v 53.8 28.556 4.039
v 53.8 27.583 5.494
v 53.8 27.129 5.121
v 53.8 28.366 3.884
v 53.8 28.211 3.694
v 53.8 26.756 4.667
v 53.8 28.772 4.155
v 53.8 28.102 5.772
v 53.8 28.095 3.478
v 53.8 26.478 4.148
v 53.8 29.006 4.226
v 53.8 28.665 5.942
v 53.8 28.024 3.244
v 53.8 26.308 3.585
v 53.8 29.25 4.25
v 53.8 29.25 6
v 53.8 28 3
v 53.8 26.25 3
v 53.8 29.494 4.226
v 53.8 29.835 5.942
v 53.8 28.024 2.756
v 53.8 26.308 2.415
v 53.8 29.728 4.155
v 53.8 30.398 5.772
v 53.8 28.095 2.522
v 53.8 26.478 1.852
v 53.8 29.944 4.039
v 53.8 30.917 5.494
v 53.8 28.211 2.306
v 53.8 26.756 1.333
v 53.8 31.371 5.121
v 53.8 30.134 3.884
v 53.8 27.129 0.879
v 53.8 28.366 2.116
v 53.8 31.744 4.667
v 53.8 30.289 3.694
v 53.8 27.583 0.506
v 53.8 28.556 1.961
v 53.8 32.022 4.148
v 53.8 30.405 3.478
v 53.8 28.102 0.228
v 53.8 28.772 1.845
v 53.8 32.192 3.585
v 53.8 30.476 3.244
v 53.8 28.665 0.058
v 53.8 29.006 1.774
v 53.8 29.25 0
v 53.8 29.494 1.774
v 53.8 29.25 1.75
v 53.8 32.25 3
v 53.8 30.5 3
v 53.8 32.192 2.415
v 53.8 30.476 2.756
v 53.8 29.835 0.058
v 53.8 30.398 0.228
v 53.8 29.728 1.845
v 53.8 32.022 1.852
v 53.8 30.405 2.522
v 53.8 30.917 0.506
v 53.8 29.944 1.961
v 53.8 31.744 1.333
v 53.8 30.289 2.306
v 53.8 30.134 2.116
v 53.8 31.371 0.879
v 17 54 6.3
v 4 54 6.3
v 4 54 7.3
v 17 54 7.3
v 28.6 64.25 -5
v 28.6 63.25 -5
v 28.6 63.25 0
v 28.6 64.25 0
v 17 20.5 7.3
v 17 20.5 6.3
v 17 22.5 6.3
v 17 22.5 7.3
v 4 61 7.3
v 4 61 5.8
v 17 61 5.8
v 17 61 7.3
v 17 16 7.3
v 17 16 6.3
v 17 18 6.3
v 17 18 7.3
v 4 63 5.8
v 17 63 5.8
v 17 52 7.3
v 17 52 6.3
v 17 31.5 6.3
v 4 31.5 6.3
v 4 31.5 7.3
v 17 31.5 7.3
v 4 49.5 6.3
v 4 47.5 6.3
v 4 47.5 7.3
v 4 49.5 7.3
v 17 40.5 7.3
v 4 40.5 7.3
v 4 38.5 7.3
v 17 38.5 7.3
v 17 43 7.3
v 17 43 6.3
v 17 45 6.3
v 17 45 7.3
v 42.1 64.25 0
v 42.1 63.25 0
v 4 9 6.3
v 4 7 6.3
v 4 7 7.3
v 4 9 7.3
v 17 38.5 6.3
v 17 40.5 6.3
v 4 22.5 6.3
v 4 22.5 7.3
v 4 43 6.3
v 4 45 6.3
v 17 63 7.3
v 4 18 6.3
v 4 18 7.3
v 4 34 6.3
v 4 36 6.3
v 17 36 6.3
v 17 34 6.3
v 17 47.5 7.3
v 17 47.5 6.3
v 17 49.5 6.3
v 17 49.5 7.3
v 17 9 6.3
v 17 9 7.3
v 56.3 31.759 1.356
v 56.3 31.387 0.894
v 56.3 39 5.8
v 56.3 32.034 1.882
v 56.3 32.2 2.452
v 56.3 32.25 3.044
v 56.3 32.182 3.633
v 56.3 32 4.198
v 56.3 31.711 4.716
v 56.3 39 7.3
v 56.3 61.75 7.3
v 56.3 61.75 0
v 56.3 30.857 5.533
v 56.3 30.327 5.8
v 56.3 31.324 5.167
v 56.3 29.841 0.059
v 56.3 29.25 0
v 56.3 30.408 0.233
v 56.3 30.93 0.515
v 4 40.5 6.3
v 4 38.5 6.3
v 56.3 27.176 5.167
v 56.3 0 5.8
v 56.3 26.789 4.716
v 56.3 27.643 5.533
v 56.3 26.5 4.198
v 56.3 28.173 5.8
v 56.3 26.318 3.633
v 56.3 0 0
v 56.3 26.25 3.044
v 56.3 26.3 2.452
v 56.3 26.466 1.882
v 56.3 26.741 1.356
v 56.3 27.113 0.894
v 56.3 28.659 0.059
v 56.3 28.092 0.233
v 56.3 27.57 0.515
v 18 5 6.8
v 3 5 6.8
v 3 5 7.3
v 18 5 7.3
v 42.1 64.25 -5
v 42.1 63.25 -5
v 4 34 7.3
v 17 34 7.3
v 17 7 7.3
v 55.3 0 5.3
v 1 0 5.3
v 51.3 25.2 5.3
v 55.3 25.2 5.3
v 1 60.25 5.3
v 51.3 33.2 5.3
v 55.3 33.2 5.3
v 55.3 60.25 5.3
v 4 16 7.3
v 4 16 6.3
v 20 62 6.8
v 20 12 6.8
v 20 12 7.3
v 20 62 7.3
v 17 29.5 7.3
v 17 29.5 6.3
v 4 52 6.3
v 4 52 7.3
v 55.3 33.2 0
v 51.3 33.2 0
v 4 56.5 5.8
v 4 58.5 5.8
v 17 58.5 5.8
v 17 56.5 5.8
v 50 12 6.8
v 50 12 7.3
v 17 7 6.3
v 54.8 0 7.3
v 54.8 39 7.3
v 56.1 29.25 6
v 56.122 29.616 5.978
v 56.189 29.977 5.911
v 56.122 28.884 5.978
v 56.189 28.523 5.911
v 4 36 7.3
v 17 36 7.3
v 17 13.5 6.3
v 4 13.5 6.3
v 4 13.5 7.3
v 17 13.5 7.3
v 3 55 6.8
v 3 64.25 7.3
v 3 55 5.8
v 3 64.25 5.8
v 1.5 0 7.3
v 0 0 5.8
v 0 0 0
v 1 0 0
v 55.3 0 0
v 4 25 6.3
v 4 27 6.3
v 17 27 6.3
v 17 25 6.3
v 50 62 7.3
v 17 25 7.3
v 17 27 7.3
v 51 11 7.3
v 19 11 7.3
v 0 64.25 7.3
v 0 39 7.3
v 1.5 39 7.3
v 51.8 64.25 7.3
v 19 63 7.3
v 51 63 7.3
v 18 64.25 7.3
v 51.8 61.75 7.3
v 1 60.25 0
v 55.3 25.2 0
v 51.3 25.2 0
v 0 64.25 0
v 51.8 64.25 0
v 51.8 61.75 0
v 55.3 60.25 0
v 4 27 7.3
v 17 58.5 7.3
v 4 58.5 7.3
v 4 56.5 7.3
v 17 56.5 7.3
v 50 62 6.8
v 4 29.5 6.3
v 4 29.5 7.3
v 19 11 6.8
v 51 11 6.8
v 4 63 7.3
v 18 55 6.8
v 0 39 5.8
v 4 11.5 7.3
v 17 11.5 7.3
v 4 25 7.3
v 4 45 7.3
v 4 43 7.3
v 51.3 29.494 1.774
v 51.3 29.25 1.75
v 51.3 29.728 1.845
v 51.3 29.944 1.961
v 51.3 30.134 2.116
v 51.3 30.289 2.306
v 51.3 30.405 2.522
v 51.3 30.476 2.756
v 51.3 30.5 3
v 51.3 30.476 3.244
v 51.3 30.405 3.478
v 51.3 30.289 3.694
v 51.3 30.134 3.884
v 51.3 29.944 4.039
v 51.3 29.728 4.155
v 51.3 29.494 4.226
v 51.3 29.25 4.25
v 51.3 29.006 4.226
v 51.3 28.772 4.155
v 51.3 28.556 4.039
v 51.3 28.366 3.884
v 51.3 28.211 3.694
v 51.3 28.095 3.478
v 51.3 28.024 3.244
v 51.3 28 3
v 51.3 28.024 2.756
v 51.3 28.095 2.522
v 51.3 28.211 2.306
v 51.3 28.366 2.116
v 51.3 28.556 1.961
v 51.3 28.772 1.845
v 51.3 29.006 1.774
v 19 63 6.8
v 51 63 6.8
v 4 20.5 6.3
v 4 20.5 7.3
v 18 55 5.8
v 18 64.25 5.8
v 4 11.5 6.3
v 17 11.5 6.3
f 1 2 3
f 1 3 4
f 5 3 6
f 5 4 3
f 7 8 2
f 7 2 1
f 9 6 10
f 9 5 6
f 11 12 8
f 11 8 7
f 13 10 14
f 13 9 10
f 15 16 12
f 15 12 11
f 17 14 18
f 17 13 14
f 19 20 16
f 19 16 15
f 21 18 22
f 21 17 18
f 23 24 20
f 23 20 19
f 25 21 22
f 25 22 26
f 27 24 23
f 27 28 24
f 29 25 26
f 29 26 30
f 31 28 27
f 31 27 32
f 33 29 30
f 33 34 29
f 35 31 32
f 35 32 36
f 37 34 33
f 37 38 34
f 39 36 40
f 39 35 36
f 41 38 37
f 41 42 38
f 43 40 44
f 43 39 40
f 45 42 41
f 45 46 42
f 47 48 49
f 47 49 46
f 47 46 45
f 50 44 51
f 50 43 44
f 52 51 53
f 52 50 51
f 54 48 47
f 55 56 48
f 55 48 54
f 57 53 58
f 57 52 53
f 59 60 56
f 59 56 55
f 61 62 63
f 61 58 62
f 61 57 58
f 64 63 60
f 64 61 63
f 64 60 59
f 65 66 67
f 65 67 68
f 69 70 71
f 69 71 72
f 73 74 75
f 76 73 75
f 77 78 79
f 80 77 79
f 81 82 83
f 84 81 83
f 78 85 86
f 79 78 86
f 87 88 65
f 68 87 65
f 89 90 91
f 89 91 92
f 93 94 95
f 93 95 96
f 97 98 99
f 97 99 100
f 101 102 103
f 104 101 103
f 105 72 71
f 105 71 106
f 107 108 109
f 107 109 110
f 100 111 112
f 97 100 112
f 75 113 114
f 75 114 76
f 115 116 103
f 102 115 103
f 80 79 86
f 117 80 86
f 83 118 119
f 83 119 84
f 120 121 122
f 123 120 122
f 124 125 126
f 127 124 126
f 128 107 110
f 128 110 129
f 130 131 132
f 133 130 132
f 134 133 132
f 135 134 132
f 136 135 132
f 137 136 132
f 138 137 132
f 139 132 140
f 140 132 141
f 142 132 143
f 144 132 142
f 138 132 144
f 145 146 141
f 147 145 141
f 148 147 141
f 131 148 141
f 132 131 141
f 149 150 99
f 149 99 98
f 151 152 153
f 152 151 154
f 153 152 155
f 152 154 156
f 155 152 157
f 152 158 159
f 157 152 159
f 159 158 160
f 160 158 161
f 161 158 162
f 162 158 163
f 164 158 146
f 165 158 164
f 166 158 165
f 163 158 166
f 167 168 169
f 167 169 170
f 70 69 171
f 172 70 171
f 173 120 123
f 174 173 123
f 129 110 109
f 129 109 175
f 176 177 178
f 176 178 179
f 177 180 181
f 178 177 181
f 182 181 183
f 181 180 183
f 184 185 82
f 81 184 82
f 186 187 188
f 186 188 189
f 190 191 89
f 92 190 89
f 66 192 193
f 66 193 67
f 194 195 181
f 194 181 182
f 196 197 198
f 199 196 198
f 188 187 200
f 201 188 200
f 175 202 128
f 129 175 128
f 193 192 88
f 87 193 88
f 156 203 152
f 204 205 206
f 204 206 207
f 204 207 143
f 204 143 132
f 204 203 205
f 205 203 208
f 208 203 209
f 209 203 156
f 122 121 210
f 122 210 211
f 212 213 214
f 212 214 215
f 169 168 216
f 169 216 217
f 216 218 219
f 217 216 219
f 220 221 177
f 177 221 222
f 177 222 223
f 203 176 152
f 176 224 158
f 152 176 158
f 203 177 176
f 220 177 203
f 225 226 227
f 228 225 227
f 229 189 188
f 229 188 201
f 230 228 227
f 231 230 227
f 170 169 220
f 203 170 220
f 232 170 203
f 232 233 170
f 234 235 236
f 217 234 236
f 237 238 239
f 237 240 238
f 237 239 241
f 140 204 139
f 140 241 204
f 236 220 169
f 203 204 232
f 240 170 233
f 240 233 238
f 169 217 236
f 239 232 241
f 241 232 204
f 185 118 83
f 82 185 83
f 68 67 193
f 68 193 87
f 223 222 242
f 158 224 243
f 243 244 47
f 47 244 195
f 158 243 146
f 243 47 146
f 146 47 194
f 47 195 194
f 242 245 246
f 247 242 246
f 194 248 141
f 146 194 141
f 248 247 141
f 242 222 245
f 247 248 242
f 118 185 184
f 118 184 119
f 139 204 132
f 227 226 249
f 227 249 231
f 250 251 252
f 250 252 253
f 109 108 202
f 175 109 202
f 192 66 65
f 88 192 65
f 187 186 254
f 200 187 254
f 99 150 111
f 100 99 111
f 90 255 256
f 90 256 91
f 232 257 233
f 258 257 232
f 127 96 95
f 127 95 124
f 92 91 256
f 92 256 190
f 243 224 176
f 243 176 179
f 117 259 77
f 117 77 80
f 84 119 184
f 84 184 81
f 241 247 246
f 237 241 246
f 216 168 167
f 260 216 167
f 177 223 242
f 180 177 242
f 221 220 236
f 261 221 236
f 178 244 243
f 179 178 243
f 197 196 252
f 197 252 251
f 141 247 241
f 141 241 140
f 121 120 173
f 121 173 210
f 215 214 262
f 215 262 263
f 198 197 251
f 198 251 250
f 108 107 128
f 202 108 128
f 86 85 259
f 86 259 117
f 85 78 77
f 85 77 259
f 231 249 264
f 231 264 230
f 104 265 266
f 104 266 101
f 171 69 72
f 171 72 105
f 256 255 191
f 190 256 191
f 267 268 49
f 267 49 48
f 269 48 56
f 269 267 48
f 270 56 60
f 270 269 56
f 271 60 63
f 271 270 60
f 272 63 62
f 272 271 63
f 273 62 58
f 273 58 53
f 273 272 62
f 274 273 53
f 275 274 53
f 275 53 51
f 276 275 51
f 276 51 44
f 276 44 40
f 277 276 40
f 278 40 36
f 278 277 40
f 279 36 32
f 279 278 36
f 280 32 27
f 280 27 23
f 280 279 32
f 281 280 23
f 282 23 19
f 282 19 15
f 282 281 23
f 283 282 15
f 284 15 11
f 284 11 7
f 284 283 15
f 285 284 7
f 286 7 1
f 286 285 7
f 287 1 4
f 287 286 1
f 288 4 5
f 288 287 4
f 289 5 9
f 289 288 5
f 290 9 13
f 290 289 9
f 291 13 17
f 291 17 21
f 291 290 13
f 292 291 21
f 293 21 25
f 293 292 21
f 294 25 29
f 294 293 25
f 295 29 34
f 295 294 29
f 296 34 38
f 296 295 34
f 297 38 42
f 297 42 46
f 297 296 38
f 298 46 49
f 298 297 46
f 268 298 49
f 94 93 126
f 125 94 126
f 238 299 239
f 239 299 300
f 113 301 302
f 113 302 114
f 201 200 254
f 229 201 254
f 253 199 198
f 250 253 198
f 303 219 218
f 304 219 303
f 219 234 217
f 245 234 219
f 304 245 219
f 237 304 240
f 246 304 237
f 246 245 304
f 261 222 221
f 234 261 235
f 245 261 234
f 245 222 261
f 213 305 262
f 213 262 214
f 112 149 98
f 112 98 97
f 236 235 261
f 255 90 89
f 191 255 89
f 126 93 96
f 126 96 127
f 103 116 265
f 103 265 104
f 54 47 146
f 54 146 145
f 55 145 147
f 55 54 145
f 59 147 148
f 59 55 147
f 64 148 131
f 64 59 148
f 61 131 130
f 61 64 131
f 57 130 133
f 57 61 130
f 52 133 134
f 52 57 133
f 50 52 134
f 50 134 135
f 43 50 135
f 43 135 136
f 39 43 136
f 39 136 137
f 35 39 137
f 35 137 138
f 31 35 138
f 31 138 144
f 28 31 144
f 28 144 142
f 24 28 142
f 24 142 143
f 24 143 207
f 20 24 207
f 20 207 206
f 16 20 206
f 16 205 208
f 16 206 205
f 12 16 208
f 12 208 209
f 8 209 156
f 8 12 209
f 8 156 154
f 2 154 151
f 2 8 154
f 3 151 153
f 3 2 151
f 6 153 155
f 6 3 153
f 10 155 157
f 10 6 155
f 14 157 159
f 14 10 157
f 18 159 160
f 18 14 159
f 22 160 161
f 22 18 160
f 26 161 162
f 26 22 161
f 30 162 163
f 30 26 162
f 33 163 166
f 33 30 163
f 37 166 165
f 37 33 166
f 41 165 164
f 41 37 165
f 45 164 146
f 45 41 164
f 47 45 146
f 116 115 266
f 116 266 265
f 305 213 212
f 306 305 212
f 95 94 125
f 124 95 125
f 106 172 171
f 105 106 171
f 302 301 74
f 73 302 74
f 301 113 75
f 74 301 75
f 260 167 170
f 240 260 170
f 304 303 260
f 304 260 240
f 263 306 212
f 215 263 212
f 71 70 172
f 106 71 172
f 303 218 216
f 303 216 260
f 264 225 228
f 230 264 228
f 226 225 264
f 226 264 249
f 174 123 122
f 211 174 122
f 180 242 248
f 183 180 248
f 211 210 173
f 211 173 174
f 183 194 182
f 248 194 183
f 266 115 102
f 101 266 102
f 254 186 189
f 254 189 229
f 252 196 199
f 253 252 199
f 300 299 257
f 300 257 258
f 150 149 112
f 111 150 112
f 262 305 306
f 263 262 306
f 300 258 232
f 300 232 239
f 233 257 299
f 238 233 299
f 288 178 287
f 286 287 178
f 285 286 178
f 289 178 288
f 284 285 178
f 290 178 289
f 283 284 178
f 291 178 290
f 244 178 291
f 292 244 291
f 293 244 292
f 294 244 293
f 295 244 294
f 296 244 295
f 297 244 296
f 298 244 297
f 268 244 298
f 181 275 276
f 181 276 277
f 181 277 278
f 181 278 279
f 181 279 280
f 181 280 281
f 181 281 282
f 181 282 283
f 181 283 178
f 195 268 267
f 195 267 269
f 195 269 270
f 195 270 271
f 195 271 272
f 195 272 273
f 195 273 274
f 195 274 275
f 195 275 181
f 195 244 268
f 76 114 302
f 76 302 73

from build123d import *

# Parameters (mm, degrees)
BOX017_W          = 30
BOX017_H          = 50
BOX017_DEPTH      = 0.5
BOX020_W          = 13
BOX020_H          = 2
BOX020_DEPTH      = 1
BOX021_W          = 13
BOX021_H          = 2
BOX021_DEPTH      = 1
BOX022_W          = 13
BOX022_H          = 2
BOX022_DEPTH      = 1
BOX023_W          = 13
BOX023_H          = 2
BOX023_DEPTH      = 1
BOX024_W          = 13
BOX024_H          = 2
BOX024_DEPTH      = 1
BOX025_W          = 13
BOX025_H          = 2
BOX025_DEPTH      = 1
BOX030_W          = 13
BOX030_H          = 2
BOX030_DEPTH      = 1
BOX031_W          = 13
BOX031_H          = 2
BOX031_DEPTH      = 1
BOX032_W          = 13
BOX032_H          = 2
BOX032_DEPTH      = 1
BOX034_W          = 13
BOX034_H          = 2
BOX034_DEPTH      = 1
BOX035_W          = 13
BOX035_H          = 2
BOX035_DEPTH      = 1
BOX038_W          = 13
BOX038_H          = 2
BOX038_DEPTH      = 1.5
BOX040_W          = 13
BOX040_H          = 2
BOX040_DEPTH      = 1.5
BOX043_W          = 13.5
BOX043_H          = 1
BOX043_DEPTH      = 5
CYLINDER001_R     = 1.25
CYLINDER001_DEPTH = 2.5
CYLINDER_R        = 3
CYLINDER_DEPTH    = 2.5
BOX041_W          = 32
BOX041_H          = 52
BOX041_DEPTH      = 0.5
BOX018_W          = 15
BOX018_H          = 53
BOX018_DEPTH      = 0.5
BOX008_W          = 56.3
BOX008_H          = 39
BOX008_DEPTH      = 2
CHAMFER_SIZE      = 1.5
BOX019_W          = 15
BOX019_H          = 9.25
BOX019_DEPTH      = 1.5
BOX029_W          = 17
BOX029_H          = 9.25
BOX029_DEPTH      = 1.5
BOX010_W          = 10
BOX010_H          = 10
BOX010_DEPTH      = 10
BOX007_W          = 56.3
BOX007_H          = 25.25
BOX007_DEPTH      = 2
BOX042_W          = 54.3
BOX042_H          = 60.25
BOX042_DEPTH      = 5.3
BOX001_W          = 4.5
BOX001_H          = 2.5
BOX001_DEPTH      = 5.3
BOX_W             = 56.3
BOX_H             = 64.25
BOX_DEPTH         = 5.3
BOX044_W          = 4
BOX044_H          = 8
BOX044_DEPTH      = 5.3


with BuildPart() as cube_game_lable_inner:
    # Box017 → Box017 (new body)
    with BuildSketch(Plane(origin=(20, 12, 6.8), x_dir=(1, 0, 0), z_dir=(0, 0, 1))):
        with Locations((15, 25)):
            Rectangle(BOX017_W, BOX017_H)
    extrude(amount=BOX017_DEPTH)


with BuildPart() as cube_ladders:
    # Box020 → Box020 (new body)
    with BuildSketch(Plane(origin=(4, 7, 6.3), x_dir=(1, 0, 0), z_dir=(0, 0, 1))):
        with Locations((6.5, 1)):
            Rectangle(BOX020_W, BOX020_H)
    extrude(amount=BOX020_DEPTH)


with BuildPart() as box021:
    # Box021 → Box021 (new body)
    with BuildSketch(Plane(origin=(4, 11.5, 6.3), x_dir=(1, 0, 0), z_dir=(0, 0, 1))):
        with Locations((6.5, 1)):
            Rectangle(BOX021_W, BOX021_H)
    extrude(amount=BOX021_DEPTH)


with BuildPart() as box022:
    # Box022 → Box022 (new body)
    with BuildSketch(Plane(origin=(4, 16, 6.3), x_dir=(1, 0, 0), z_dir=(0, 0, 1))):
        with Locations((6.5, 1)):
            Rectangle(BOX022_W, BOX022_H)
    extrude(amount=BOX022_DEPTH)


with BuildPart() as box023:
    # Box023 → Box023 (new body)
    with BuildSketch(Plane(origin=(4, 20.5, 6.3), x_dir=(1, 0, 0), z_dir=(0, 0, 1))):
        with Locations((6.5, 1)):
            Rectangle(BOX023_W, BOX023_H)
    extrude(amount=BOX023_DEPTH)


with BuildPart() as box024:
    # Box024 → Box024 (new body)
    with BuildSketch(Plane(origin=(4, 25, 6.3), x_dir=(1, 0, 0), z_dir=(0, 0, 1))):
        with Locations((6.5, 1)):
            Rectangle(BOX024_W, BOX024_H)
    extrude(amount=BOX024_DEPTH)


with BuildPart() as box025:
    # Box025 → Box025 (new body)
    with BuildSketch(Plane(origin=(4, 29.5, 6.3), x_dir=(1, 0, 0), z_dir=(0, 0, 1))):
        with Locations((6.5, 1)):
            Rectangle(BOX025_W, BOX025_H)
    extrude(amount=BOX025_DEPTH)


with BuildPart() as box030:
    # Box030 → Box030 (new body)
    with BuildSketch(Plane(origin=(4, 34, 6.3), x_dir=(1, 0, 0), z_dir=(0, 0, 1))):
        with Locations((6.5, 1)):
            Rectangle(BOX030_W, BOX030_H)
    extrude(amount=BOX030_DEPTH)


with BuildPart() as box031:
    # Box031 → Box031 (new body)
    with BuildSketch(Plane(origin=(4, 38.5, 6.3), x_dir=(1, 0, 0), z_dir=(0, 0, 1))):
        with Locations((6.5, 1)):
            Rectangle(BOX031_W, BOX031_H)
    extrude(amount=BOX031_DEPTH)


with BuildPart() as box032:
    # Box032 → Box032 (new body)
    with BuildSketch(Plane(origin=(4, 43, 6.3), x_dir=(1, 0, 0), z_dir=(0, 0, 1))):
        with Locations((6.5, 1)):
            Rectangle(BOX032_W, BOX032_H)
    extrude(amount=BOX032_DEPTH)


with BuildPart() as box034:
    # Box034 → Box034 (new body)
    with BuildSketch(Plane(origin=(4, 47.5, 6.3), x_dir=(1, 0, 0), z_dir=(0, 0, 1))):
        with Locations((6.5, 1)):
            Rectangle(BOX034_W, BOX034_H)
    extrude(amount=BOX034_DEPTH)


with BuildPart() as box035:
    # Box035 → Box035 (new body)
    with BuildSketch(Plane(origin=(4, 52, 6.3), x_dir=(1, 0, 0), z_dir=(0, 0, 1))):
        with Locations((6.5, 1)):
            Rectangle(BOX035_W, BOX035_H)
    extrude(amount=BOX035_DEPTH)


with BuildPart() as box038:
    # Box038 → Box038 (new body)
    with BuildSketch(Plane(origin=(4, 56.5, 5.8), x_dir=(1, 0, 0), z_dir=(0, 0, 1))):
        with Locations((6.5, 1)):
            Rectangle(BOX038_W, BOX038_H)
    extrude(amount=BOX038_DEPTH)


with BuildPart() as box040:
    # Box040 → Box040 (new body)
    with BuildSketch(Plane(origin=(4, 61, 5.8), x_dir=(1, 0, 0), z_dir=(0, 0, 1))):
        with Locations((6.5, 1)):
            Rectangle(BOX040_W, BOX040_H)
    extrude(amount=BOX040_DEPTH)


with BuildPart() as cube_sd_card_cover:
    # Box043 → Box043 (new body)
    with BuildSketch(Plane(origin=(28.6, 63.25, -5), x_dir=(1, 0, 0), z_dir=(0, 0, 1))):
        with Locations((6.75, 0.5)):
            Rectangle(BOX043_W, BOX043_H)
    extrude(amount=BOX043_DEPTH)


with BuildPart() as cylinder001:
    # Cylinder001 → Cylinder001 (new body)
    with BuildSketch(Plane(origin=(51.3, 29.25, 3), x_dir=(0, 0, -1), z_dir=(1, 0, 0))):
        Circle(CYLINDER001_R)
    extrude(amount=CYLINDER001_DEPTH)


with BuildPart() as fusion:
    # Cylinder → Cylinder (new body)
    with BuildSketch(Plane(origin=(53.8, 29.25, 3), x_dir=(0, 0, -1), z_dir=(1, 0, 0))):
        Circle(CYLINDER_R)
    extrude(amount=CYLINDER_DEPTH)

    # Fusion: union Cylinder001
    add(cylinder001.part)


with BuildPart() as cube_game_lable_outer:
    # Box041 → Box041 (new body)
    with BuildSketch(Plane(origin=(19, 11, 6.8), x_dir=(1, 0, 0), z_dir=(0, 0, 1))):
        with Locations((16, 26)):
            Rectangle(BOX041_W, BOX041_H)
    extrude(amount=BOX041_DEPTH)


with BuildPart() as cube_cube_strips:
    # Box018 → Box018 (new body)
    with BuildSketch(Plane(origin=(3, 5, 6.8), x_dir=(1, 0, 0), z_dir=(0, 0, 1))):
        with Locations((7.5, 26.5)):
            Rectangle(BOX018_W, BOX018_H)
    extrude(amount=BOX018_DEPTH)


with BuildPart() as chamfer_body:
    # Box008 → Box008 (new body)
    with BuildSketch(Plane.XY.offset(5.3)):
        with Locations((28.15, 19.5)):
            Rectangle(BOX008_W, BOX008_H)
    extrude(amount=BOX008_DEPTH)

    # Chamfer
    chamfer_edges = [chamfer_body.edges().sort_by_distance(p)[0] for p in [
        (0, 19.5, 7.3),
        (56.3, 19.5, 7.3),
    ]]
    chamfer(chamfer_edges, length=CHAMFER_SIZE)


with BuildPart() as cube_cube_strip_top:
    # Box019 → Box019 (new body)
    with BuildSketch(Plane(origin=(3, 55, 5.8), x_dir=(1, 0, 0), z_dir=(0, 0, 1))):
        with Locations((7.5, 4.625)):
            Rectangle(BOX019_W, BOX019_H)
    extrude(amount=BOX019_DEPTH)


with BuildPart() as cube_cube_strip_top_outer:
    # Box029 → Box029 (new body)
    with BuildSketch(Plane(origin=(2, 55, 5.8), x_dir=(1, 0, 0), z_dir=(0, 0, 1))):
        with Locations((8.5, 4.625)):
            Rectangle(BOX029_W, BOX029_H)
    extrude(amount=BOX029_DEPTH)


with BuildPart() as cube_top_corner_cut:
    # Box010 → Box010 (new body)
    with BuildSketch(Plane(origin=(51.8, 61.75, 0), x_dir=(1, 0, 0), z_dir=(0, 0, 1))):
        with Locations((5, 5)):
            Rectangle(BOX010_W, BOX010_H)
    extrude(amount=BOX010_DEPTH)


with BuildPart() as cut013:
    # Box007 → Box007 (new body)
    with BuildSketch(Plane(origin=(0, 39, 5.3), x_dir=(1, 0, 0), z_dir=(0, 0, 1))):
        with Locations((28.15, 12.625)):
            Rectangle(BOX007_W, BOX007_H)
    extrude(amount=BOX007_DEPTH)

    # Cut006: cut Cube(top_corner_cut)
    add(cube_top_corner_cut.part, mode=Mode.SUBTRACT)

    # Fusion003: union Cube(cube_strip_top_outer)
    add(cube_cube_strip_top_outer.part)

    # Cut008: cut Cube(cube_strip_top)
    add(cube_cube_strip_top.part, mode=Mode.SUBTRACT)

    # Fusion004: union Chamfer body
    add(chamfer_body.part)

    # Cut012: cut Cube(cube_strips)
    add(cube_cube_strips.part, mode=Mode.SUBTRACT)

    # Cut013: cut Cube(game_lable_outer)
    add(cube_game_lable_outer.part, mode=Mode.SUBTRACT)


with BuildPart() as box042:
    # Box042 → Box042 (new body)
    with BuildSketch(Plane(origin=(1, 0, 0), x_dir=(1, 0, 0), z_dir=(0, 0, 1))):
        with Locations((27.15, 30.125)):
            Rectangle(BOX042_W, BOX042_H)
    extrude(amount=BOX042_DEPTH)


with BuildPart() as cube_corner_inner:
    # Box001 → Box001 (new body)
    with BuildSketch(Plane(origin=(51.8, 61.75, 0), x_dir=(1, 0, 0), z_dir=(0, 0, 1))):
        with Locations((2.25, 1.25)):
            Rectangle(BOX001_W, BOX001_H)
    extrude(amount=BOX001_DEPTH)


with BuildPart() as cut014:
    # Box → Box (new body)
    with BuildSketch(Plane.XY):
        with Locations((28.15, 32.125)):
            Rectangle(BOX_W, BOX_H)
    extrude(amount=BOX_DEPTH)

    # Cut: cut Cube(corner_inner)
    add(cube_corner_inner.part, mode=Mode.SUBTRACT)

    # Cut014: cut Box042
    add(box042.part, mode=Mode.SUBTRACT)


with BuildPart() as cut015:
    # Box044 → Box044 (new body)
    with BuildSketch(Plane(origin=(51.3, 25.2, 0), x_dir=(1, 0, 0), z_dir=(0, 0, 1))):
        with Locations((2, 4)):
            Rectangle(BOX044_W, BOX044_H)
    extrude(amount=BOX044_DEPTH)

    # Fusion005: union Cut014
    add(cut014.part)

    # Fusion006: union Cut013
    add(cut013.part)

    # Cut015: cut Fusion
    add(fusion.part, mode=Mode.SUBTRACT)


solid = Compound([cube_game_lable_inner.part, cube_ladders.part, box021.part, box022.part, box023.part, box024.part, box025.part, box030.part, box031.part, box032.part, box034.part, box035.part, box038.part, box040.part, cube_sd_card_cover.part, cut015.part])
